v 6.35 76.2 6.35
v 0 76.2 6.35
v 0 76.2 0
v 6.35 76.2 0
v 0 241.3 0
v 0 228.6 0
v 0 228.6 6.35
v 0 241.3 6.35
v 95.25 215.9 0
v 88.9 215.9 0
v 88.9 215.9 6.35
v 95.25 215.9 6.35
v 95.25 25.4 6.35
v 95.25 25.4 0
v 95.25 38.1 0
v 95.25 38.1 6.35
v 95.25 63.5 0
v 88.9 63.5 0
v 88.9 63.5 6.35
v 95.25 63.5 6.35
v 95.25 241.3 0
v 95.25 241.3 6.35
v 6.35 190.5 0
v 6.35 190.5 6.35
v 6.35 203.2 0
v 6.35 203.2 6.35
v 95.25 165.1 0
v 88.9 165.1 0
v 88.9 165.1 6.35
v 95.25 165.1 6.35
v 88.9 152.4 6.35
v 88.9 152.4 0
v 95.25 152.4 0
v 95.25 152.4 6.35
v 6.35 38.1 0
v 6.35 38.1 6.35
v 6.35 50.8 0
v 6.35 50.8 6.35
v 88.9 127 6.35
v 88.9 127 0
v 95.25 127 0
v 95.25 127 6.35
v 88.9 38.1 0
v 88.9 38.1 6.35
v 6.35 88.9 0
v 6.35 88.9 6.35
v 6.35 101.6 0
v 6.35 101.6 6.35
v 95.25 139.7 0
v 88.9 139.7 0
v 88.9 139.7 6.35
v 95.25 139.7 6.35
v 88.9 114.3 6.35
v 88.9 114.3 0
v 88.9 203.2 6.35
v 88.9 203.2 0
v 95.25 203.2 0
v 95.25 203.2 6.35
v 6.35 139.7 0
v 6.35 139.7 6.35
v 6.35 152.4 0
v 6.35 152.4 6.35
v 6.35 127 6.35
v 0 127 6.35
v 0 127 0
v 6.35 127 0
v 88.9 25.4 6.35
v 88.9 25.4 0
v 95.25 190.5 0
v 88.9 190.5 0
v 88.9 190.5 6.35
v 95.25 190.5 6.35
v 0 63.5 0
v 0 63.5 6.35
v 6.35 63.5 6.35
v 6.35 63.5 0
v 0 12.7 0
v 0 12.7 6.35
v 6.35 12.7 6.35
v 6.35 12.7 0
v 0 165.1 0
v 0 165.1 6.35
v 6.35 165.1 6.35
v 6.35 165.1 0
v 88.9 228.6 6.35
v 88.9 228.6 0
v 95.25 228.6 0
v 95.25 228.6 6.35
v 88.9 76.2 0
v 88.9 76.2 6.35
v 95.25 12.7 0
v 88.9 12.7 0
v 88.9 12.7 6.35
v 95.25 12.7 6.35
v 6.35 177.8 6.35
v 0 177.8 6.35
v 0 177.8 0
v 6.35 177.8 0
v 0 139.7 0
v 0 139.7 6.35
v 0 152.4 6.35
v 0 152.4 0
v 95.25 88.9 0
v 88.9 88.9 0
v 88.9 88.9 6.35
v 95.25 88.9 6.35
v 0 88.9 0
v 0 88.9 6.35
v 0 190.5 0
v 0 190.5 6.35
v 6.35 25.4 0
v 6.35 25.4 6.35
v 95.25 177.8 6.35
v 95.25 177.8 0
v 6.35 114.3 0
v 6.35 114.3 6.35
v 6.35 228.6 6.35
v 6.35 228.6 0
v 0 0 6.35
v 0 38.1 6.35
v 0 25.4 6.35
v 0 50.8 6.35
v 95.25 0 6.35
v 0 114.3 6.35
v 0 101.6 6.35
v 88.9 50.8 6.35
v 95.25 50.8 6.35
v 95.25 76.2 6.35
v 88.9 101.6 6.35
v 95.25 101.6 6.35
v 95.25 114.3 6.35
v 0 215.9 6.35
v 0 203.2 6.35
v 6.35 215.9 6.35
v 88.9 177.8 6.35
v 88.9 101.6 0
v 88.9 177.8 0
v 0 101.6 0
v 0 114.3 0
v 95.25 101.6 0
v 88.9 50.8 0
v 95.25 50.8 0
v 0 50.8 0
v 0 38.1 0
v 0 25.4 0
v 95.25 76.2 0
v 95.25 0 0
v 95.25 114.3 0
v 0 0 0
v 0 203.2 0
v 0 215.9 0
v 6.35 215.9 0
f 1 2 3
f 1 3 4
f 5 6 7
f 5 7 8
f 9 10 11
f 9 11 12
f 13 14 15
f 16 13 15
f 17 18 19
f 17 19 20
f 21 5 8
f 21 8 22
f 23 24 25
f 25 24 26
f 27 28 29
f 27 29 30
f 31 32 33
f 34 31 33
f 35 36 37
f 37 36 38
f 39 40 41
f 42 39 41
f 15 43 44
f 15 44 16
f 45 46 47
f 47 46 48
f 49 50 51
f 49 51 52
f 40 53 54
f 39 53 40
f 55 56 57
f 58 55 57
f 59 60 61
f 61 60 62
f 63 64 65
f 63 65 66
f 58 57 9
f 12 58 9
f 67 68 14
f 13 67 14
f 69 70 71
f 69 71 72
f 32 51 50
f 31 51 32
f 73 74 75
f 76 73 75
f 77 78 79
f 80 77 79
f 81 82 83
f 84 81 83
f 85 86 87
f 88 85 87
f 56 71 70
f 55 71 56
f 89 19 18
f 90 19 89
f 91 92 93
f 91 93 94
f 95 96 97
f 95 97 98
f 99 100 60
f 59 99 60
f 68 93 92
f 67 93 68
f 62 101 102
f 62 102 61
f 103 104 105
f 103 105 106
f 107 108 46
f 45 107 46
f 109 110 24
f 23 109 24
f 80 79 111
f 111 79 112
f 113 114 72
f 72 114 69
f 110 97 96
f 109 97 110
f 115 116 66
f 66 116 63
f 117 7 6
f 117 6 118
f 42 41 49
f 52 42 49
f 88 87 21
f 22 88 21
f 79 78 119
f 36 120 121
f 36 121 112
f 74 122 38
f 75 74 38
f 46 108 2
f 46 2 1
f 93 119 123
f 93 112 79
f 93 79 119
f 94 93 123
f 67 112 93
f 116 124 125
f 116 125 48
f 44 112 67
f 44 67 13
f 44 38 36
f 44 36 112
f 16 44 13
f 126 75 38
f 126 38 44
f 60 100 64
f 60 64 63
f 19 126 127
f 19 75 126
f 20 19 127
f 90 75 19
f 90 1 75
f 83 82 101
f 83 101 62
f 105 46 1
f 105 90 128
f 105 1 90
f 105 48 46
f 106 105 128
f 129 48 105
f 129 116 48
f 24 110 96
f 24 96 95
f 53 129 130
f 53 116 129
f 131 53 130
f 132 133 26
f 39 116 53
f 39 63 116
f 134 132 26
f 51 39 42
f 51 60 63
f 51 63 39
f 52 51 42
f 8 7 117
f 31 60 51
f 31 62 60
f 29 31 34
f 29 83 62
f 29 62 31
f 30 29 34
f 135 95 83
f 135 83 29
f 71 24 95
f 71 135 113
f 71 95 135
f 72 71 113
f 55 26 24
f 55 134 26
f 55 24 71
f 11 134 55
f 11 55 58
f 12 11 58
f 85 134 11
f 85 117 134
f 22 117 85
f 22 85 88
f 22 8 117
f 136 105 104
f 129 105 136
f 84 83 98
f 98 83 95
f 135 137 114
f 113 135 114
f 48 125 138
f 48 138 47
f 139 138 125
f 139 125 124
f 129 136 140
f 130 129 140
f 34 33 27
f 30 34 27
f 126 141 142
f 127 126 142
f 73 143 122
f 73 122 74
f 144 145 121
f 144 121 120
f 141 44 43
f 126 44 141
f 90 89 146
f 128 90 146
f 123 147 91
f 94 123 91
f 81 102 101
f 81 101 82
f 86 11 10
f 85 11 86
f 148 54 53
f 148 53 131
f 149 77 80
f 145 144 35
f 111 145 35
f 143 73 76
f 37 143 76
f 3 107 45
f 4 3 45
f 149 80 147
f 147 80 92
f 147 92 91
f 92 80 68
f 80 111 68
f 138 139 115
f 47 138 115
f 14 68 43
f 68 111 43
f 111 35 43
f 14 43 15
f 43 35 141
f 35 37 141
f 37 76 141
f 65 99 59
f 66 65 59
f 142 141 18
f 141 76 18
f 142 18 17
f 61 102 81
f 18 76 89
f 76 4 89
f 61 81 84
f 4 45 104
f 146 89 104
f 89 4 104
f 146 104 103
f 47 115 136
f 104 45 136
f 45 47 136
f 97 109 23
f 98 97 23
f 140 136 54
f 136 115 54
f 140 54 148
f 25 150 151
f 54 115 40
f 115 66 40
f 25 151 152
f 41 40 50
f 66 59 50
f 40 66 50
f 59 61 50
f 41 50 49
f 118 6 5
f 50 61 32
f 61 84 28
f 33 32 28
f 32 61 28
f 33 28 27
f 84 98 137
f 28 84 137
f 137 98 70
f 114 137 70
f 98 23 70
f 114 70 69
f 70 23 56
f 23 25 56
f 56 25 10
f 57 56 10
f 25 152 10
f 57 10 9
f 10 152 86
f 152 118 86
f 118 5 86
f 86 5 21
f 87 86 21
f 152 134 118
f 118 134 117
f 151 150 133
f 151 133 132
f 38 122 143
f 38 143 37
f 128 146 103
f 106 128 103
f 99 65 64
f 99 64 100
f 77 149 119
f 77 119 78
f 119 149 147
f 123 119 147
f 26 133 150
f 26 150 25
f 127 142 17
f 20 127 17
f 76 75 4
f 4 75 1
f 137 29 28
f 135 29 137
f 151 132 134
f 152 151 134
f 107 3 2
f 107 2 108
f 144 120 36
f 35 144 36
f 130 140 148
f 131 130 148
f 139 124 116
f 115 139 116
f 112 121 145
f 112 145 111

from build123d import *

# Parameters (mm, degrees)
SKETCH1_W           = 95.25
SKETCH1_H           = 241.3
BOSS_EXTRUDE1_DEPTH = 6.35
SKETCH2_W           = 6.35
SKETCH2_H           = 12.7
CUT_EXTRUDE1_DEPTH  = 7.35
LPATTERN1_COUNT     = 9
LPATTERN1_PITCH     = 25.4


with BuildPart() as part:
    # Sketch1 → Boss-Extrude1 (new body)
    with BuildSketch(Plane.XY):
        with Locations((47.625, 120.65)):
            Rectangle(SKETCH1_W, SKETCH1_H)
    extrude(amount=BOSS_EXTRUDE1_DEPTH)

    # Sketch2 → Cut-Extrude1 (cut, through all)
    with BuildSketch(Plane.XY.offset(6.35)):
        with Locations((3.175, 222.25)):
            Rectangle(SKETCH2_W, SKETCH2_H)
        with Locations((92.075, 222.25)):
            Rectangle(SKETCH2_W, SKETCH2_H)
    cut_extrude1 = extrude(amount=-CUT_EXTRUDE1_DEPTH, mode=Mode.SUBTRACT)

    # LPattern1: Cut-Extrude1 ×9
    with Locations(*[(0, -i * LPATTERN1_PITCH, 0) for i in range(1, LPATTERN1_COUNT)]):
        add(cut_extrude1, mode=Mode.SUBTRACT)


solid = part.part
